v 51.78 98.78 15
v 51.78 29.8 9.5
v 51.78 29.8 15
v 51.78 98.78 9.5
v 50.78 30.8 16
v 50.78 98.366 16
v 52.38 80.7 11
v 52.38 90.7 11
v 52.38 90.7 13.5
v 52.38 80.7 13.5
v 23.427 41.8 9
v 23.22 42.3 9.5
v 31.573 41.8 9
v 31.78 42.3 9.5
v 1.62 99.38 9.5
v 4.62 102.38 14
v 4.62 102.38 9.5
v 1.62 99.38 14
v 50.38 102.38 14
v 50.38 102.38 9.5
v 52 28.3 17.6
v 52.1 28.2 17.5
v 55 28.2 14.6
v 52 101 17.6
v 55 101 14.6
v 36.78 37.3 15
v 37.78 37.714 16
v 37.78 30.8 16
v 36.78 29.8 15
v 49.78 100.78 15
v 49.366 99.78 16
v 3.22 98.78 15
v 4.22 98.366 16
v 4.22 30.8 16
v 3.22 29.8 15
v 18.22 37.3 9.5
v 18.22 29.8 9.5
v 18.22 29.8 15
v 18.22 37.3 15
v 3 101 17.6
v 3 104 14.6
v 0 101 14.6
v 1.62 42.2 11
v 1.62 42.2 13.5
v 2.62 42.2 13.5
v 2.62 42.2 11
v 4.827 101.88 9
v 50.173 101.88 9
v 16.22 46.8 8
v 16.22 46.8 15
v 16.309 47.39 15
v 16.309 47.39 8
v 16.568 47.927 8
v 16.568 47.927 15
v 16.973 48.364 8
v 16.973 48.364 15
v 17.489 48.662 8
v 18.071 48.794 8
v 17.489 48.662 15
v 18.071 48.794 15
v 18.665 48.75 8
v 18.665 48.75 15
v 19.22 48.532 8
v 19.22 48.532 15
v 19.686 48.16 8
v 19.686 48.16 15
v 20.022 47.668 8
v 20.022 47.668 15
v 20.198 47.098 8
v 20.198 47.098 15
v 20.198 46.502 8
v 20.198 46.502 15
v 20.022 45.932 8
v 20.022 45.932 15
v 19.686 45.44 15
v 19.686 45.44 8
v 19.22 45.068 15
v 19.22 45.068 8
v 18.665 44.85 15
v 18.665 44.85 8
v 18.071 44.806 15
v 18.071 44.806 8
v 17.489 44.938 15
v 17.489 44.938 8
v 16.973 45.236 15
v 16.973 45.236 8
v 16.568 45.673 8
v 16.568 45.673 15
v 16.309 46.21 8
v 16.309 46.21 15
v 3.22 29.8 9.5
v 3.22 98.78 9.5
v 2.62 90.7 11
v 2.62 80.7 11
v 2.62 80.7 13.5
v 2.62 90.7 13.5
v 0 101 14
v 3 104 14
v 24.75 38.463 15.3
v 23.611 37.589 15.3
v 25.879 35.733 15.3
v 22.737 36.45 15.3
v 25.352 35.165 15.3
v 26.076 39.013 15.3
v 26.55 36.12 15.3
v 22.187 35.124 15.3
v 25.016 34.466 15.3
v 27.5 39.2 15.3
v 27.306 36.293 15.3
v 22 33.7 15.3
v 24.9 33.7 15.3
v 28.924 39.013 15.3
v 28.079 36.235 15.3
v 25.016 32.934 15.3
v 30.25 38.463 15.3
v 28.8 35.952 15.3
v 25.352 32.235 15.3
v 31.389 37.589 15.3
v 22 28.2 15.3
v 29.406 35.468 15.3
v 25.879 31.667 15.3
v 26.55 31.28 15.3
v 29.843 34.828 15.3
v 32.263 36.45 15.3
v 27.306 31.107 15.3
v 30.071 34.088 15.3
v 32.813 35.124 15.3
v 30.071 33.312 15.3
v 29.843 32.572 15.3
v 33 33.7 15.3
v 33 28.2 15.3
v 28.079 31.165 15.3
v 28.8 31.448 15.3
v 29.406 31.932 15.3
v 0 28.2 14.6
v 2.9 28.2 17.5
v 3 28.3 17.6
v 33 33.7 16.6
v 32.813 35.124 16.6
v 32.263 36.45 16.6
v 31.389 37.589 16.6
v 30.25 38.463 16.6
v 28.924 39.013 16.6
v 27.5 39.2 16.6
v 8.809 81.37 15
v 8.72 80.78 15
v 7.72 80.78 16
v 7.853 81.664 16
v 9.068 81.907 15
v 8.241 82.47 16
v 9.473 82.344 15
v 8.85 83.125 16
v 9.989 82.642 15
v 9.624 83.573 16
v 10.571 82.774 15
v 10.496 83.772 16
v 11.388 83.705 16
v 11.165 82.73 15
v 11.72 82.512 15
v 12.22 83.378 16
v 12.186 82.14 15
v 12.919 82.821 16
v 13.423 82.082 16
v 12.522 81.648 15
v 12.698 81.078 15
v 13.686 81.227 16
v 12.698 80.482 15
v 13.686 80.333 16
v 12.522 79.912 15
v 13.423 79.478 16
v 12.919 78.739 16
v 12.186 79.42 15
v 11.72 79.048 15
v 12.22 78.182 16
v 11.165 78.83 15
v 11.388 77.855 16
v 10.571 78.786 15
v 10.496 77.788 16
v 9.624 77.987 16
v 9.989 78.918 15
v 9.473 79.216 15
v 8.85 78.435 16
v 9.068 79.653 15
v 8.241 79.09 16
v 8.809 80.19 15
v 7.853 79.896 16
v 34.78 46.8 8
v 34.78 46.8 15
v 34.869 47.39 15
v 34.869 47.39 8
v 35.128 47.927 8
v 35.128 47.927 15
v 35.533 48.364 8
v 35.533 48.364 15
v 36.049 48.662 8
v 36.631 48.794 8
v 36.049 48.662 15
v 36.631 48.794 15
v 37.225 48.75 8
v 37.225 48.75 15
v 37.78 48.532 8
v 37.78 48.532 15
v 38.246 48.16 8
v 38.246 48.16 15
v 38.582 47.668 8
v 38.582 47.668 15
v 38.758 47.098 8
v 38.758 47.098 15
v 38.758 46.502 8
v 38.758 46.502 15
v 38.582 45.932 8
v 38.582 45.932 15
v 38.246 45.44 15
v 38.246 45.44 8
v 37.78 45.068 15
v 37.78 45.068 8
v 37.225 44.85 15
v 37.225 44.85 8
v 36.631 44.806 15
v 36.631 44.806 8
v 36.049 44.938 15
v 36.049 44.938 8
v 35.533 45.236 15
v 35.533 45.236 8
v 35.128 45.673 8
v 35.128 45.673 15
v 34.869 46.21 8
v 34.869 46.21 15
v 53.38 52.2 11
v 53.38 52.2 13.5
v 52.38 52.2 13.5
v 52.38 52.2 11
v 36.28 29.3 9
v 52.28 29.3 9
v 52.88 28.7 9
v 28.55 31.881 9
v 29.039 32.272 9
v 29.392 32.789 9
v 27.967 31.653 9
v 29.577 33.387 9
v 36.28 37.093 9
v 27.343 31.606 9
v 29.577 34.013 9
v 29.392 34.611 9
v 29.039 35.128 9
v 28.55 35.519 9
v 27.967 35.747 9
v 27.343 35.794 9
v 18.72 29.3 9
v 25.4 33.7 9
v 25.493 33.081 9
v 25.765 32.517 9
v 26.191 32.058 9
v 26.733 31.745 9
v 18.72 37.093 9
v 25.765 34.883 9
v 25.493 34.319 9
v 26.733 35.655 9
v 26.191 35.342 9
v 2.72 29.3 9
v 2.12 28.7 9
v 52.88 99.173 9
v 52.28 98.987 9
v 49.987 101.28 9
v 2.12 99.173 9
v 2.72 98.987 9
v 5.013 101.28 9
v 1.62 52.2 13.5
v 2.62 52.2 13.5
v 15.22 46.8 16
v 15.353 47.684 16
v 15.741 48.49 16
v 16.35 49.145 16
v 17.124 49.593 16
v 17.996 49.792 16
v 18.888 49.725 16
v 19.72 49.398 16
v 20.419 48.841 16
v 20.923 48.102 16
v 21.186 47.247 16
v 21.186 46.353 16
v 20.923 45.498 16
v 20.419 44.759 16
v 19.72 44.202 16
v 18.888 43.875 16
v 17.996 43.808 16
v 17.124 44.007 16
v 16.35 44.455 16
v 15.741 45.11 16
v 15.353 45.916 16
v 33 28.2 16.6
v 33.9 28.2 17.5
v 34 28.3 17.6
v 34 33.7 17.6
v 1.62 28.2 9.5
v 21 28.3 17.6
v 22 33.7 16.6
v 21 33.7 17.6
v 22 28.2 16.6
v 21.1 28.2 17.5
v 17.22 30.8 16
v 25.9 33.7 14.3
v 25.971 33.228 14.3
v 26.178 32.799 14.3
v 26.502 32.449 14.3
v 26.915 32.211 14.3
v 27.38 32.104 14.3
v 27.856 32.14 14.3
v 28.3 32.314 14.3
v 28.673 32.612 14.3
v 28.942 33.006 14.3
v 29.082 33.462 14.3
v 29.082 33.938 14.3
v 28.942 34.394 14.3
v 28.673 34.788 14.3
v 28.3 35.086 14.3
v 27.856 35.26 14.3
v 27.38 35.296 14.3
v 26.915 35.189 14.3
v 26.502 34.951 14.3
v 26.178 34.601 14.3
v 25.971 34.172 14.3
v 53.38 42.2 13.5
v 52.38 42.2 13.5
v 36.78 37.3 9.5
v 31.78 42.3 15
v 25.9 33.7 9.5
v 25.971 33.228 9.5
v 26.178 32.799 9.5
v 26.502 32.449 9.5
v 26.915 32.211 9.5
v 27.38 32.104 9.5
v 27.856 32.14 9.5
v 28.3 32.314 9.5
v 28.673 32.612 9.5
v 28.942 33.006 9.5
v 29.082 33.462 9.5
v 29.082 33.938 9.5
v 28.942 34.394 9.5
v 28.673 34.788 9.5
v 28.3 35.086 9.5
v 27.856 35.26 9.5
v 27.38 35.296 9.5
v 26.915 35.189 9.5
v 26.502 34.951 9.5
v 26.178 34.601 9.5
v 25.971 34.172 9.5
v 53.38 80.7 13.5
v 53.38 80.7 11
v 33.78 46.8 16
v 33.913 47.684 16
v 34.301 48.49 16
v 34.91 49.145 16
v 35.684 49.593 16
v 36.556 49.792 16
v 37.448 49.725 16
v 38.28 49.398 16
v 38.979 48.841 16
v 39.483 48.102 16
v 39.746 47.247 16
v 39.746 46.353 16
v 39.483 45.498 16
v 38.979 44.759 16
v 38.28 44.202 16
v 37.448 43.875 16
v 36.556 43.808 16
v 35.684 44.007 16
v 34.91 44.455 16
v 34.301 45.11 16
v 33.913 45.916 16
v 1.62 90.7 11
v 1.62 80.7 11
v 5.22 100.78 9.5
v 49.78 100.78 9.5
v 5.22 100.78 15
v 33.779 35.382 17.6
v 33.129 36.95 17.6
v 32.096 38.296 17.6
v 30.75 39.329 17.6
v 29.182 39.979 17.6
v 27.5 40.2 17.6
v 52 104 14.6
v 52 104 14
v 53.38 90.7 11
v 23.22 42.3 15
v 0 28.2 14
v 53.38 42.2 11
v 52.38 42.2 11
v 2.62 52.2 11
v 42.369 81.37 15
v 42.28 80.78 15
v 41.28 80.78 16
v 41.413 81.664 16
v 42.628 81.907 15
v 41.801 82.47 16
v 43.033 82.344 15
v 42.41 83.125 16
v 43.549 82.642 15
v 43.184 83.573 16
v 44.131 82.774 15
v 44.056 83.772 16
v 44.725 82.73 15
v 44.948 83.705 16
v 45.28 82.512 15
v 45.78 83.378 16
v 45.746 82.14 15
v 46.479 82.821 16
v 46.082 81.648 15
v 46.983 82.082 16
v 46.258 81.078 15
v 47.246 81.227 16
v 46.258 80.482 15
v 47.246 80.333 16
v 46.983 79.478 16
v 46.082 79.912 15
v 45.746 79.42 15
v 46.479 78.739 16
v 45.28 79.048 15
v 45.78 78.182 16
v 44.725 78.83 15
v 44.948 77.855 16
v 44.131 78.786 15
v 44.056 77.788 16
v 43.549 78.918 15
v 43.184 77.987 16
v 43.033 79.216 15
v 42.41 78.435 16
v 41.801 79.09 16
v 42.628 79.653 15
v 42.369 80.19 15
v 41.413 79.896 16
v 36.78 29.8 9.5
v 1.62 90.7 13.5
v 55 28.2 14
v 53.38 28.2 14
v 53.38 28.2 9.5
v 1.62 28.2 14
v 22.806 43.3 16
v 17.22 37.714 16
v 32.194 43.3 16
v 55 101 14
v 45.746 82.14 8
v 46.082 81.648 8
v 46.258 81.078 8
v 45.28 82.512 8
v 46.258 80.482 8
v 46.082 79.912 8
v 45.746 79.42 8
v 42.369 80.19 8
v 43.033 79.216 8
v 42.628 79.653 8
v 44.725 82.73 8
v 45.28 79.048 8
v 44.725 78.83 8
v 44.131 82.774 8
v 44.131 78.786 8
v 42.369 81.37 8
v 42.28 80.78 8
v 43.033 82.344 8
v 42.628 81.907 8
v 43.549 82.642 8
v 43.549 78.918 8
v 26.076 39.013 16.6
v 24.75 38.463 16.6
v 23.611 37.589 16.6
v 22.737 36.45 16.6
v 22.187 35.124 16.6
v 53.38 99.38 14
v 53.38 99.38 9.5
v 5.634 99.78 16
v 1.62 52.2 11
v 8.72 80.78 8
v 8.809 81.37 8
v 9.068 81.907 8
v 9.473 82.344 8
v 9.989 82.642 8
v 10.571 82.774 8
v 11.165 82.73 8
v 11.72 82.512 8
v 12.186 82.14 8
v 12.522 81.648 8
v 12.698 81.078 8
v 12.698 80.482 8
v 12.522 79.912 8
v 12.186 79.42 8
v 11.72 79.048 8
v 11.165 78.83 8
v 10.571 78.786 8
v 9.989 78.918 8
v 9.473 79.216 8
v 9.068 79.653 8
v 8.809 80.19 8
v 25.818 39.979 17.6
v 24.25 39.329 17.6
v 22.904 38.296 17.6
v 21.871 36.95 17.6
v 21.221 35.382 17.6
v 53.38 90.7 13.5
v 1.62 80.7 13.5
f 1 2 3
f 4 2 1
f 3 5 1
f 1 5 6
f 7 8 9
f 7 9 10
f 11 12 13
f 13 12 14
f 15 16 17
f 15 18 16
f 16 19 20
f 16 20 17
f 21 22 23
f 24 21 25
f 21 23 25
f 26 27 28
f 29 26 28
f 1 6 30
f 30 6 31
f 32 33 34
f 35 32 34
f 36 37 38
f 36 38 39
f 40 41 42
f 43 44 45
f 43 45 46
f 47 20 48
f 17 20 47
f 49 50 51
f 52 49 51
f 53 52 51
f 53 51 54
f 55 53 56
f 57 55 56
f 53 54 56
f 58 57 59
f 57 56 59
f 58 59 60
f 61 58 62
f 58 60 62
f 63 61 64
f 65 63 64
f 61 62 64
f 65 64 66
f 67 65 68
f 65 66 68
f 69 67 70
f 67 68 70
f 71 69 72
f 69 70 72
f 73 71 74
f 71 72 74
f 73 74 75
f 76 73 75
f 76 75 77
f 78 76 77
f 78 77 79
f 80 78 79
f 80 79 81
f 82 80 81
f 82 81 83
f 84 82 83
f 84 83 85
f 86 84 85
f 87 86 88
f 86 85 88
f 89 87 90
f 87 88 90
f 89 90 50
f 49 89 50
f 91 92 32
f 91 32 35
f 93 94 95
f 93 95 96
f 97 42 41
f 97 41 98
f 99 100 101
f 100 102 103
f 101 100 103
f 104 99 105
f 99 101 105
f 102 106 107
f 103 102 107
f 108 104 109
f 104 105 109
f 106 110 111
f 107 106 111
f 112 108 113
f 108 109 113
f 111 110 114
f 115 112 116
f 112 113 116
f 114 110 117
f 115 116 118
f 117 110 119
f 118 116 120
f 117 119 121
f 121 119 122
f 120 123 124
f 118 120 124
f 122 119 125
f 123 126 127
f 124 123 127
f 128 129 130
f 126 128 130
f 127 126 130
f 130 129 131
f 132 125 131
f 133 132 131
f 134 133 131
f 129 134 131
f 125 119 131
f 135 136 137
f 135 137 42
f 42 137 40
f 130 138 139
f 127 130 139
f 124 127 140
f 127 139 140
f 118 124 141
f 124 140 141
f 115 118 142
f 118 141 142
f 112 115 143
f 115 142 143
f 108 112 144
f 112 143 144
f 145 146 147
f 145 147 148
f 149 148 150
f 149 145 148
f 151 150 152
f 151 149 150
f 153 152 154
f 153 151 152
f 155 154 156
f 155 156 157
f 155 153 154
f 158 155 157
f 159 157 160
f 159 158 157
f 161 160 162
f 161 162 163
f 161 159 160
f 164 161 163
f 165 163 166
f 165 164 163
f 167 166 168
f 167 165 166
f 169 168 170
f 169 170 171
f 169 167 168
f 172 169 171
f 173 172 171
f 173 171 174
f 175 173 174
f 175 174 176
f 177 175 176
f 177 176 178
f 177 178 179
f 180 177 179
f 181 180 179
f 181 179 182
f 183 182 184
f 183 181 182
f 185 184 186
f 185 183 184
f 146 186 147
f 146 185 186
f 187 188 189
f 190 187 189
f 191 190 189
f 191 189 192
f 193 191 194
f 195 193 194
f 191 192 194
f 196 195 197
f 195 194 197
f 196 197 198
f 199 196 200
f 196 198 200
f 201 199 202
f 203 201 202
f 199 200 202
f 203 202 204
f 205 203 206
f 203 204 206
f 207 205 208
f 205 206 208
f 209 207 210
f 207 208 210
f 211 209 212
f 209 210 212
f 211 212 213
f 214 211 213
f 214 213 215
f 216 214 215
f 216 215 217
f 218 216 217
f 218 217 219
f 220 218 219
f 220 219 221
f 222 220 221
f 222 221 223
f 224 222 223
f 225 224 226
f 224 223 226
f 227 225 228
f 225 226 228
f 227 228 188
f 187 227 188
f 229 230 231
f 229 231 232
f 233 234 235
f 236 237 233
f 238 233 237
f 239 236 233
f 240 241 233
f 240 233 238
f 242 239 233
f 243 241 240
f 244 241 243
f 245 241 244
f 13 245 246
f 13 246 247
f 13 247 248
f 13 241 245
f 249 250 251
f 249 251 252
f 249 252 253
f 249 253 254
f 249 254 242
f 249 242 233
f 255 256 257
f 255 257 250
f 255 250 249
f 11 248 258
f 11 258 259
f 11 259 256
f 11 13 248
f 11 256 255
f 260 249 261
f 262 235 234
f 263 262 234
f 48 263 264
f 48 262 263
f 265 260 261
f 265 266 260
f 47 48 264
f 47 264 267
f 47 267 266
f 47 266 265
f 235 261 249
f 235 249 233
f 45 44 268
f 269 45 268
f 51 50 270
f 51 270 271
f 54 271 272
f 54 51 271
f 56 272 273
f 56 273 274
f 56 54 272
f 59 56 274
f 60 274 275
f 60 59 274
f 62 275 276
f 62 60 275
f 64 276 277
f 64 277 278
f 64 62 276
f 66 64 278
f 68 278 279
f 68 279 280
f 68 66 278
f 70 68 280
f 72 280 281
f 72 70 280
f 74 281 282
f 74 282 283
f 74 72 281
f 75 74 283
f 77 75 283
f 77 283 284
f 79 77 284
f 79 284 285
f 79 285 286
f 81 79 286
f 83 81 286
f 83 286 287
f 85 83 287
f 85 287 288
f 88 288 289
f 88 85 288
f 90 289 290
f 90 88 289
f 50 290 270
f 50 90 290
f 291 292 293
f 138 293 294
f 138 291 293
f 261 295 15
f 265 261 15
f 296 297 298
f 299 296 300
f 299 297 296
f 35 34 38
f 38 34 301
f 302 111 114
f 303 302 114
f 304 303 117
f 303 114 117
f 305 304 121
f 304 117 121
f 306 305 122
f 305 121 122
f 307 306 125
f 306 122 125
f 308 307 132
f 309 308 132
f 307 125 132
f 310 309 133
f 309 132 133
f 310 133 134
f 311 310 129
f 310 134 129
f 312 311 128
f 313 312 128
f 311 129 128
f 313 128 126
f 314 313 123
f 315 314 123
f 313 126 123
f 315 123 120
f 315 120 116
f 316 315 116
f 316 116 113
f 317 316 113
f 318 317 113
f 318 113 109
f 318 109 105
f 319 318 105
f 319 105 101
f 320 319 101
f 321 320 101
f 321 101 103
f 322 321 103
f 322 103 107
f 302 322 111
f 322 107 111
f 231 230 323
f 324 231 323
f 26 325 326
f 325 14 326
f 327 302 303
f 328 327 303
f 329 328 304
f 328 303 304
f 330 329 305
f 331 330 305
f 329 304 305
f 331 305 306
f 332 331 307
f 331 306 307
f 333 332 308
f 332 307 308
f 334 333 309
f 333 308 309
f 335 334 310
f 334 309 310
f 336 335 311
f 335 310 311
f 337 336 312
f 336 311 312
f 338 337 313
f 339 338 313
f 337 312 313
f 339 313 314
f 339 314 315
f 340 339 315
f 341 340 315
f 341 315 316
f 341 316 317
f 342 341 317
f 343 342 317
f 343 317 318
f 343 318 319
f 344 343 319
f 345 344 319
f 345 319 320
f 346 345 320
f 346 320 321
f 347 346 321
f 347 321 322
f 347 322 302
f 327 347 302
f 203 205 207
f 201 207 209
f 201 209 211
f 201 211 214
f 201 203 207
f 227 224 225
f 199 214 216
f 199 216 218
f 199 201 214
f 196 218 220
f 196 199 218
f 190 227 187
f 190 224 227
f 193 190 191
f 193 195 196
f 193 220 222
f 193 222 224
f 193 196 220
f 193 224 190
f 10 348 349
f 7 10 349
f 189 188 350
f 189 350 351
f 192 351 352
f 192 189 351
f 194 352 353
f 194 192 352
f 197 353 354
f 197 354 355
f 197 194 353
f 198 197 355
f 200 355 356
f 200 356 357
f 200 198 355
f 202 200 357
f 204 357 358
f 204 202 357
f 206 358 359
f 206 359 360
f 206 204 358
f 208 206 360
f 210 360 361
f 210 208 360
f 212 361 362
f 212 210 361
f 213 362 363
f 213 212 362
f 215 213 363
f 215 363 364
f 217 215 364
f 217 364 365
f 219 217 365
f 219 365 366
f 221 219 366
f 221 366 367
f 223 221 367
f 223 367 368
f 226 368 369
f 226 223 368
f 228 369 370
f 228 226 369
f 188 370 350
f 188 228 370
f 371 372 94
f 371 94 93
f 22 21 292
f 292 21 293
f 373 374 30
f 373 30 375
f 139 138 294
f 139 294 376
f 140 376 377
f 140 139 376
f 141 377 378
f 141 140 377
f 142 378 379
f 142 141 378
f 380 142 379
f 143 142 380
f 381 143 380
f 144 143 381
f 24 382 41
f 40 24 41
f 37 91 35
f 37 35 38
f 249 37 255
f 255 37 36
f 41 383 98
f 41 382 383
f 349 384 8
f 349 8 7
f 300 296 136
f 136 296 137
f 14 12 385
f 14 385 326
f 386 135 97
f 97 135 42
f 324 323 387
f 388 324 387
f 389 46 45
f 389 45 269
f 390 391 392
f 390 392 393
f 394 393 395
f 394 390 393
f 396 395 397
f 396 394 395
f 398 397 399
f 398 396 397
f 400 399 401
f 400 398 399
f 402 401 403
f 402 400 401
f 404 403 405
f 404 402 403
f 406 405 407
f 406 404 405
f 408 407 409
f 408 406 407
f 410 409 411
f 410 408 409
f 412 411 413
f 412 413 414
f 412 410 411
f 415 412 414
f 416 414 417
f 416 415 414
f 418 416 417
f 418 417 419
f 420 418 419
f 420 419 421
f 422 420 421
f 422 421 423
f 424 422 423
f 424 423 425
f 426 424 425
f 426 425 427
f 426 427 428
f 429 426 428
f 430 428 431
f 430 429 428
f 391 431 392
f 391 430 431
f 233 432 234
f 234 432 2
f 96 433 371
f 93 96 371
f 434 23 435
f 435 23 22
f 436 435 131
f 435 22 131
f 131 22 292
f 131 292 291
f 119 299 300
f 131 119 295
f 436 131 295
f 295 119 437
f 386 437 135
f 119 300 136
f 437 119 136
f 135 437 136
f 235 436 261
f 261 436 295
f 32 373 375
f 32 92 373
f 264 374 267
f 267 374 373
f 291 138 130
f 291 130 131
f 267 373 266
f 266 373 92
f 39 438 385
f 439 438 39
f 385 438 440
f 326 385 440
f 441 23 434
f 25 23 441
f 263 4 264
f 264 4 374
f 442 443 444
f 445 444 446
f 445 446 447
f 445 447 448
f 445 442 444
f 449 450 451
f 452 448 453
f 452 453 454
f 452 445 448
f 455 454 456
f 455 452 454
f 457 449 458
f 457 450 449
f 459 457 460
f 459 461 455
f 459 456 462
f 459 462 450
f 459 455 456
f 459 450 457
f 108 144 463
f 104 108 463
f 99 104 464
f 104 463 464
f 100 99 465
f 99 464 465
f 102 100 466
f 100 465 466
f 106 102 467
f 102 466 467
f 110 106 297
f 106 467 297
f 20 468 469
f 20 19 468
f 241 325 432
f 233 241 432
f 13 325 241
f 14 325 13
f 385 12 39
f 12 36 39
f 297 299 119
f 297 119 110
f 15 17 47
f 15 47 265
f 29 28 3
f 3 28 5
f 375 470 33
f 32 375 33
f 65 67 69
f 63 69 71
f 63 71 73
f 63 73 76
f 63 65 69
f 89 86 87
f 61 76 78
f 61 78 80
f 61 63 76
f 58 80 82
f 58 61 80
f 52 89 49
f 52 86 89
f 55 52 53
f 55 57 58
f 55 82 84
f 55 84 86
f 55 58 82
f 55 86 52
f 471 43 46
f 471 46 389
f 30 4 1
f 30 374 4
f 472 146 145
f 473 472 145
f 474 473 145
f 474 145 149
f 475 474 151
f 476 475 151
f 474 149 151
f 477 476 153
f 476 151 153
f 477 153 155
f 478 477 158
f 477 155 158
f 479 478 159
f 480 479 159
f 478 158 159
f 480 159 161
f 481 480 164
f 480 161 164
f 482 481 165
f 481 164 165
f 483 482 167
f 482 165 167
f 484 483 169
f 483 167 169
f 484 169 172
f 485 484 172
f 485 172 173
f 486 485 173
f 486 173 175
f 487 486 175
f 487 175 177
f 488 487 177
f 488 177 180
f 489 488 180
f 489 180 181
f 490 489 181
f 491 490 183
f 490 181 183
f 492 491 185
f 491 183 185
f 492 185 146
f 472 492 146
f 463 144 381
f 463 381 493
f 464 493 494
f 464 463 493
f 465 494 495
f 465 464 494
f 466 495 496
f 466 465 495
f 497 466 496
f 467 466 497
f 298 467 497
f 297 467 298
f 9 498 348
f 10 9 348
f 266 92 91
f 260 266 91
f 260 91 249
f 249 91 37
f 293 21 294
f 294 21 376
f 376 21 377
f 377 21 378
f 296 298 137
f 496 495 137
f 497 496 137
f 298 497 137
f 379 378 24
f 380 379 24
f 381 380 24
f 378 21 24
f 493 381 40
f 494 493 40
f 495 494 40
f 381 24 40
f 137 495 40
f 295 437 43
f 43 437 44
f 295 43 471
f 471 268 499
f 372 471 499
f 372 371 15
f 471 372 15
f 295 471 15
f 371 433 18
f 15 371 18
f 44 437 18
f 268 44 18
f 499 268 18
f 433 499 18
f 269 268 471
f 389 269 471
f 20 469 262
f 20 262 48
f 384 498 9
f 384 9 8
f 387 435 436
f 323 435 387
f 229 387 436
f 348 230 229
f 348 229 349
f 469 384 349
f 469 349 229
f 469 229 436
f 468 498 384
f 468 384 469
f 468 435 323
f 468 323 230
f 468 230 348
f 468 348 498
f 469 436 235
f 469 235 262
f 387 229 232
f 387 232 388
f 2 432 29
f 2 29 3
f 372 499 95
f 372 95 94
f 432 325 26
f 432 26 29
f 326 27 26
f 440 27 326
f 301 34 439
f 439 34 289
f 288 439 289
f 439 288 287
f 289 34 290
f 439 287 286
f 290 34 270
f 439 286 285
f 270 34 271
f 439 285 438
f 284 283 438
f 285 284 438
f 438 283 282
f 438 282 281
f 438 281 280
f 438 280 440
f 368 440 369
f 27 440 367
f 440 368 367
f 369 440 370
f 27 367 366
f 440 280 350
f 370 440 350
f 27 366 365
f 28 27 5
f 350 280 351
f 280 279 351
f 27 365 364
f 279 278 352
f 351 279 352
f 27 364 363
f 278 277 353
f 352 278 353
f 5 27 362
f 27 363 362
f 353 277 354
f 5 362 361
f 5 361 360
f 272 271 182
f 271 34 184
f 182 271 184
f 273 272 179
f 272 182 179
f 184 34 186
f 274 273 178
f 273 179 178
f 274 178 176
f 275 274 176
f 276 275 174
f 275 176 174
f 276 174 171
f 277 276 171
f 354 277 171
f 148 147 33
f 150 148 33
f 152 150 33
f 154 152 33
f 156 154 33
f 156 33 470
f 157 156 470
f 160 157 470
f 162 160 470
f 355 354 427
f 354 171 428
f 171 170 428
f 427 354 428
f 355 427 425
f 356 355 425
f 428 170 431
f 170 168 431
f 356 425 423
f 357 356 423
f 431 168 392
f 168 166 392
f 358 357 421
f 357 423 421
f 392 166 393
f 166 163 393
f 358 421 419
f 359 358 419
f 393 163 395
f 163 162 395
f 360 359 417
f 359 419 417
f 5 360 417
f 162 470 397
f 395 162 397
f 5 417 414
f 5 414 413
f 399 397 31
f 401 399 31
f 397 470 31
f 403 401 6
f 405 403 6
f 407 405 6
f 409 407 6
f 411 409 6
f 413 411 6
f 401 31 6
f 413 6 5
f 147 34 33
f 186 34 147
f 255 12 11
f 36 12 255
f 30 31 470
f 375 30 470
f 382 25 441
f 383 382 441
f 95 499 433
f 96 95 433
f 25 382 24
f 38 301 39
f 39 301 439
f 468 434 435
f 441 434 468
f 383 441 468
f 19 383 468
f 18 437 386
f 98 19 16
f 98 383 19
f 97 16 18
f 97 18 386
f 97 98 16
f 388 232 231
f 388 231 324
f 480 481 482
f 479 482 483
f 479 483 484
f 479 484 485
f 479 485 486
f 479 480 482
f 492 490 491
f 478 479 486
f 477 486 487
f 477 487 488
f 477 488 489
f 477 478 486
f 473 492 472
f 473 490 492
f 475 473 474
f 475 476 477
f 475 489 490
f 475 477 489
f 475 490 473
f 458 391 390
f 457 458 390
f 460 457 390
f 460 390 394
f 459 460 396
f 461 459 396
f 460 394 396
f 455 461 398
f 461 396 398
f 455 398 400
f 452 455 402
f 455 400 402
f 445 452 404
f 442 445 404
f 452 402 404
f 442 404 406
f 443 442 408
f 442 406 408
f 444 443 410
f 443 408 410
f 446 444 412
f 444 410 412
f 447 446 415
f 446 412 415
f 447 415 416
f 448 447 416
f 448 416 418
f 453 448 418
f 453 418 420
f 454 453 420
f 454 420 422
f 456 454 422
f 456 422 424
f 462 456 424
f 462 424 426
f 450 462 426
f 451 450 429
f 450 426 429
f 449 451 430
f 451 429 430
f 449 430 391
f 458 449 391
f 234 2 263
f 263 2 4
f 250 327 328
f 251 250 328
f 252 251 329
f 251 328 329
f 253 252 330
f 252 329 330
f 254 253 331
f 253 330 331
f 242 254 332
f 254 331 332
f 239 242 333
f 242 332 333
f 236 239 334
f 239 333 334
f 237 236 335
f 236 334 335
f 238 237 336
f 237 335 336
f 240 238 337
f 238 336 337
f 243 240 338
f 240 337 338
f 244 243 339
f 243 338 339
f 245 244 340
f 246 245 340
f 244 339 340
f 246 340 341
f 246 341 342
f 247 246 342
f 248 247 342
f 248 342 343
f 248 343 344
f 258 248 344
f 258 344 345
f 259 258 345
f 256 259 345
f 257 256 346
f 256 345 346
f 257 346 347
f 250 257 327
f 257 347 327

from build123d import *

# Parameters (mm, degrees)
SKETCH017_W     = 55
SKETCH017_H     = 75.8
PAD012_DEPTH    = 3.6
SKETCH018_W     = 51.76
SKETCH018_H     = 74.18
PAD013_DEPTH    = 5
POCKET004_DEPTH = 7
SKETCH019_R     = 2
PAD014_DEPTH    = 8
SKETCH020_W     = 10
SKETCH020_H     = 2.5
POCKET005_DEPTH = 1
SKETCH021_W     = 10
SKETCH021_H     = 2.5
POCKET006_DEPTH = 1
POCKET007_DEPTH = 2.3
SKETCH023_R     = 1.6
POCKET008_DEPTH = 7.301
CHAMFER010_SIZE = 5
CHAMFER011_SIZE = 2
CHAMFER012_SIZE = 1
CHAMFER013_SIZE = 3
CHAMFER014_SIZE = 0.5
CHAMFER015_SIZE = 1
CHAMFER016_SIZE = 3
CHAMFER017_SIZE = 0.1
CHAMFER018_SIZE = 1


with BuildPart() as part:
    # Sketch017 → Pad012 (new body)
    with BuildSketch(Plane(origin=(55, 28.2, 17.6), x_dir=(-1, 0, 0), z_dir=(0, 0, -1))):
        with Locations((27.5, 37.9)):
            Rectangle(SKETCH017_W, SKETCH017_H)
    extrude(amount=PAD012_DEPTH)

    # Sketch018 → Pad013 (new body)
    with BuildSketch(Plane(origin=(55, 28.2, 14), x_dir=(-1, 0, 0), z_dir=(0, 0, -1))):
        with Locations((27.5, 37.09)):
            Rectangle(SKETCH018_W, SKETCH018_H)
    extrude(amount=PAD013_DEPTH)

    # Sketch002 → Pocket004 (cut)
    with BuildSketch(Plane(origin=(55, 28.2, 9), x_dir=(-1, 0, 0), z_dir=(0, 0, -1))):
        Polygon((18.22, 1.6), (3.22, 1.6), (3.22, 72.58), (51.78, 72.58), (51.78, 1.6), (36.78, 1.6), (36.78, 14.1), (18.22, 14.1), align=None)
    extrude(amount=-POCKET004_DEPTH, mode=Mode.SUBTRACT)

    # Sketch019 → Pad014 (new body)
    with BuildSketch(Plane(origin=(55, 28.2, 16), x_dir=(-1, 0, 0), z_dir=(0, 0, -1))):
        with Locations((10.72, 52.58)):
            Circle(SKETCH019_R)
        with Locations((44.28, 52.58)):
            Circle(SKETCH019_R)
        with Locations((18.22, 18.6)):
            Circle(SKETCH019_R)
        with Locations((36.78, 18.6)):
            Circle(SKETCH019_R)
    extrude(amount=PAD014_DEPTH)

    # Sketch020 → Pocket005 (cut)
    with BuildSketch(Plane(origin=(1.62, 28.2, 17.6), x_dir=(0, 1, 0), z_dir=(-1, 0, 0))):
        with Locations((19, 5.35)):
            Rectangle(SKETCH020_W, SKETCH020_H)
        with Locations((57.5, 5.35)):
            Rectangle(SKETCH020_W, SKETCH020_H)
    extrude(amount=-POCKET005_DEPTH, mode=Mode.SUBTRACT)

    # Sketch021 → Pocket006 (cut)
    with BuildSketch(Plane(origin=(53.38, 28.2, 17.6), x_dir=(0, -1, 0), z_dir=(1, 0, 0))):
        with Locations((-57.5, 5.35)):
            Rectangle(SKETCH021_W, SKETCH021_H)
        with Locations((-19, 5.35)):
            Rectangle(SKETCH021_W, SKETCH021_H)
    extrude(amount=-POCKET006_DEPTH, mode=Mode.SUBTRACT)

    # Sketch022 → Pocket007 (cut)
    with BuildSketch(Plane(origin=(55, 28.2, 17.6), x_dir=(-1, 0, 0), z_dir=(0, 0, 1))):
        with BuildLine():
            Line((22, 0), (33, 0))
            Line((33, 0), (33, -5.500002))
            ThreePointArc((27.500001, -11), (31.389087, -9.389088), (33, -5.500002))
            Line((27.500001, -11), (27.499999, -11))
            ThreePointArc((22, -5.500002), (23.610913, -9.389088), (27.499999, -11))
            Line((22, -5.500002), (22, 0))
        make_face()
    extrude(amount=-POCKET007_DEPTH, mode=Mode.SUBTRACT)

    # Sketch023 → Pocket008 (cut, through all)
    with BuildSketch(Plane(origin=(55, 28.2, 15.3), x_dir=(-1, 0, 0), z_dir=(0, 0, 1))):
        with Locations((27.5, -5.5)):
            Circle(SKETCH023_R)
    extrude(amount=-POCKET008_DEPTH, mode=Mode.SUBTRACT)

    # Chamfer010
    chamfer010_edges = [part.edges().sort_by_distance(p)[0] for p in [
        (36.78, 42.3, 12.5),
        (18.22, 42.3, 12.5),
    ]]
    chamfer(chamfer010_edges, length=CHAMFER010_SIZE)

    # Chamfer011
    chamfer011_edges = [part.edges().sort_by_distance(p)[0] for p in [
        (51.78, 100.78, 12.5),
        (3.22, 100.78, 12.5),
    ]]
    chamfer(chamfer011_edges, length=CHAMFER011_SIZE)

    # Chamfer012
    chamfer012_edges = [part.edges().sort_by_distance(p)[0] for p in [
        (51.78, 64.29, 16),
        (50.78, 99.78, 16),
        (44.28, 29.8, 16),
        (27.5, 100.78, 16),
        (36.78, 33.55, 16),
        (4.22, 99.78, 16),
        (34.28, 39.8, 16),
        (3.22, 64.29, 16),
        (27.5, 42.3, 16),
        (10.72, 29.8, 16),
        (20.72, 39.8, 16),
        (18.22, 33.55, 16),
        (46.28, 80.78, 16),
        (38.78, 46.8, 16),
        (20.22, 46.8, 16),
        (12.72, 80.78, 16),
    ]]
    chamfer(chamfer012_edges, length=CHAMFER012_SIZE)

    # Chamfer013
    chamfer013_edges = [part.edges().sort_by_distance(p)[0] for p in [
        (1.62, 102.38, 11.5),
        (53.38, 102.38, 11.5),
    ]]
    chamfer(chamfer013_edges, length=CHAMFER013_SIZE)

    # Chamfer014
    chamfer014_edges = [part.edges().sort_by_distance(p)[0] for p in [
        (53.38, 63.79, 9),
        (51.88, 100.88, 9),
        (27.5, 28.2, 9),
        (27.5, 102.38, 9),
        (1.62, 63.79, 9),
        (3.12, 100.88, 9),
        (3.22, 64.29, 9),
        (4.22, 99.78, 9),
        (10.72, 29.8, 9),
        (27.5, 100.78, 9),
        (18.22, 33.55, 9),
        (50.78, 99.78, 9),
        (20.72, 39.8, 9),
        (51.78, 64.29, 9),
        (27.5, 42.3, 9),
        (44.28, 29.8, 9),
        (34.28, 39.8, 9),
        (36.78, 33.55, 9),
        (29.1, 33.7, 9),
    ]]
    chamfer(chamfer014_edges, length=CHAMFER014_SIZE)

    # Chamfer015
    chamfer015_edges = [part.edges().sort_by_distance(p)[0] for p in [
        (29.1, 33.7, 15.3),
    ]]
    chamfer(chamfer015_edges, length=CHAMFER015_SIZE)

    # Chamfer016
    chamfer016_edges = [part.edges().sort_by_distance(p)[0] for p in [
        (55, 104, 15.8),
        (0, 104, 15.8),
        (27.5, 104, 17.6),
        (0, 66.1, 17.6),
        (55, 66.1, 17.6),
    ]]
    chamfer(chamfer016_edges, length=CHAMFER016_SIZE)

    # Chamfer017
    chamfer017_edges = [part.edges().sort_by_distance(p)[0] for p in [
        (42.5, 28.2, 17.6),
        (12.5, 28.2, 17.6),
    ]]
    chamfer(chamfer017_edges, length=CHAMFER017_SIZE)

    # Chamfer018
    chamfer018_edges = [part.edges().sort_by_distance(p)[0] for p in [
        (31.389087, 37.589088, 17.6),
    ]]
    chamfer(chamfer018_edges, length=CHAMFER018_SIZE)


solid = part.part
